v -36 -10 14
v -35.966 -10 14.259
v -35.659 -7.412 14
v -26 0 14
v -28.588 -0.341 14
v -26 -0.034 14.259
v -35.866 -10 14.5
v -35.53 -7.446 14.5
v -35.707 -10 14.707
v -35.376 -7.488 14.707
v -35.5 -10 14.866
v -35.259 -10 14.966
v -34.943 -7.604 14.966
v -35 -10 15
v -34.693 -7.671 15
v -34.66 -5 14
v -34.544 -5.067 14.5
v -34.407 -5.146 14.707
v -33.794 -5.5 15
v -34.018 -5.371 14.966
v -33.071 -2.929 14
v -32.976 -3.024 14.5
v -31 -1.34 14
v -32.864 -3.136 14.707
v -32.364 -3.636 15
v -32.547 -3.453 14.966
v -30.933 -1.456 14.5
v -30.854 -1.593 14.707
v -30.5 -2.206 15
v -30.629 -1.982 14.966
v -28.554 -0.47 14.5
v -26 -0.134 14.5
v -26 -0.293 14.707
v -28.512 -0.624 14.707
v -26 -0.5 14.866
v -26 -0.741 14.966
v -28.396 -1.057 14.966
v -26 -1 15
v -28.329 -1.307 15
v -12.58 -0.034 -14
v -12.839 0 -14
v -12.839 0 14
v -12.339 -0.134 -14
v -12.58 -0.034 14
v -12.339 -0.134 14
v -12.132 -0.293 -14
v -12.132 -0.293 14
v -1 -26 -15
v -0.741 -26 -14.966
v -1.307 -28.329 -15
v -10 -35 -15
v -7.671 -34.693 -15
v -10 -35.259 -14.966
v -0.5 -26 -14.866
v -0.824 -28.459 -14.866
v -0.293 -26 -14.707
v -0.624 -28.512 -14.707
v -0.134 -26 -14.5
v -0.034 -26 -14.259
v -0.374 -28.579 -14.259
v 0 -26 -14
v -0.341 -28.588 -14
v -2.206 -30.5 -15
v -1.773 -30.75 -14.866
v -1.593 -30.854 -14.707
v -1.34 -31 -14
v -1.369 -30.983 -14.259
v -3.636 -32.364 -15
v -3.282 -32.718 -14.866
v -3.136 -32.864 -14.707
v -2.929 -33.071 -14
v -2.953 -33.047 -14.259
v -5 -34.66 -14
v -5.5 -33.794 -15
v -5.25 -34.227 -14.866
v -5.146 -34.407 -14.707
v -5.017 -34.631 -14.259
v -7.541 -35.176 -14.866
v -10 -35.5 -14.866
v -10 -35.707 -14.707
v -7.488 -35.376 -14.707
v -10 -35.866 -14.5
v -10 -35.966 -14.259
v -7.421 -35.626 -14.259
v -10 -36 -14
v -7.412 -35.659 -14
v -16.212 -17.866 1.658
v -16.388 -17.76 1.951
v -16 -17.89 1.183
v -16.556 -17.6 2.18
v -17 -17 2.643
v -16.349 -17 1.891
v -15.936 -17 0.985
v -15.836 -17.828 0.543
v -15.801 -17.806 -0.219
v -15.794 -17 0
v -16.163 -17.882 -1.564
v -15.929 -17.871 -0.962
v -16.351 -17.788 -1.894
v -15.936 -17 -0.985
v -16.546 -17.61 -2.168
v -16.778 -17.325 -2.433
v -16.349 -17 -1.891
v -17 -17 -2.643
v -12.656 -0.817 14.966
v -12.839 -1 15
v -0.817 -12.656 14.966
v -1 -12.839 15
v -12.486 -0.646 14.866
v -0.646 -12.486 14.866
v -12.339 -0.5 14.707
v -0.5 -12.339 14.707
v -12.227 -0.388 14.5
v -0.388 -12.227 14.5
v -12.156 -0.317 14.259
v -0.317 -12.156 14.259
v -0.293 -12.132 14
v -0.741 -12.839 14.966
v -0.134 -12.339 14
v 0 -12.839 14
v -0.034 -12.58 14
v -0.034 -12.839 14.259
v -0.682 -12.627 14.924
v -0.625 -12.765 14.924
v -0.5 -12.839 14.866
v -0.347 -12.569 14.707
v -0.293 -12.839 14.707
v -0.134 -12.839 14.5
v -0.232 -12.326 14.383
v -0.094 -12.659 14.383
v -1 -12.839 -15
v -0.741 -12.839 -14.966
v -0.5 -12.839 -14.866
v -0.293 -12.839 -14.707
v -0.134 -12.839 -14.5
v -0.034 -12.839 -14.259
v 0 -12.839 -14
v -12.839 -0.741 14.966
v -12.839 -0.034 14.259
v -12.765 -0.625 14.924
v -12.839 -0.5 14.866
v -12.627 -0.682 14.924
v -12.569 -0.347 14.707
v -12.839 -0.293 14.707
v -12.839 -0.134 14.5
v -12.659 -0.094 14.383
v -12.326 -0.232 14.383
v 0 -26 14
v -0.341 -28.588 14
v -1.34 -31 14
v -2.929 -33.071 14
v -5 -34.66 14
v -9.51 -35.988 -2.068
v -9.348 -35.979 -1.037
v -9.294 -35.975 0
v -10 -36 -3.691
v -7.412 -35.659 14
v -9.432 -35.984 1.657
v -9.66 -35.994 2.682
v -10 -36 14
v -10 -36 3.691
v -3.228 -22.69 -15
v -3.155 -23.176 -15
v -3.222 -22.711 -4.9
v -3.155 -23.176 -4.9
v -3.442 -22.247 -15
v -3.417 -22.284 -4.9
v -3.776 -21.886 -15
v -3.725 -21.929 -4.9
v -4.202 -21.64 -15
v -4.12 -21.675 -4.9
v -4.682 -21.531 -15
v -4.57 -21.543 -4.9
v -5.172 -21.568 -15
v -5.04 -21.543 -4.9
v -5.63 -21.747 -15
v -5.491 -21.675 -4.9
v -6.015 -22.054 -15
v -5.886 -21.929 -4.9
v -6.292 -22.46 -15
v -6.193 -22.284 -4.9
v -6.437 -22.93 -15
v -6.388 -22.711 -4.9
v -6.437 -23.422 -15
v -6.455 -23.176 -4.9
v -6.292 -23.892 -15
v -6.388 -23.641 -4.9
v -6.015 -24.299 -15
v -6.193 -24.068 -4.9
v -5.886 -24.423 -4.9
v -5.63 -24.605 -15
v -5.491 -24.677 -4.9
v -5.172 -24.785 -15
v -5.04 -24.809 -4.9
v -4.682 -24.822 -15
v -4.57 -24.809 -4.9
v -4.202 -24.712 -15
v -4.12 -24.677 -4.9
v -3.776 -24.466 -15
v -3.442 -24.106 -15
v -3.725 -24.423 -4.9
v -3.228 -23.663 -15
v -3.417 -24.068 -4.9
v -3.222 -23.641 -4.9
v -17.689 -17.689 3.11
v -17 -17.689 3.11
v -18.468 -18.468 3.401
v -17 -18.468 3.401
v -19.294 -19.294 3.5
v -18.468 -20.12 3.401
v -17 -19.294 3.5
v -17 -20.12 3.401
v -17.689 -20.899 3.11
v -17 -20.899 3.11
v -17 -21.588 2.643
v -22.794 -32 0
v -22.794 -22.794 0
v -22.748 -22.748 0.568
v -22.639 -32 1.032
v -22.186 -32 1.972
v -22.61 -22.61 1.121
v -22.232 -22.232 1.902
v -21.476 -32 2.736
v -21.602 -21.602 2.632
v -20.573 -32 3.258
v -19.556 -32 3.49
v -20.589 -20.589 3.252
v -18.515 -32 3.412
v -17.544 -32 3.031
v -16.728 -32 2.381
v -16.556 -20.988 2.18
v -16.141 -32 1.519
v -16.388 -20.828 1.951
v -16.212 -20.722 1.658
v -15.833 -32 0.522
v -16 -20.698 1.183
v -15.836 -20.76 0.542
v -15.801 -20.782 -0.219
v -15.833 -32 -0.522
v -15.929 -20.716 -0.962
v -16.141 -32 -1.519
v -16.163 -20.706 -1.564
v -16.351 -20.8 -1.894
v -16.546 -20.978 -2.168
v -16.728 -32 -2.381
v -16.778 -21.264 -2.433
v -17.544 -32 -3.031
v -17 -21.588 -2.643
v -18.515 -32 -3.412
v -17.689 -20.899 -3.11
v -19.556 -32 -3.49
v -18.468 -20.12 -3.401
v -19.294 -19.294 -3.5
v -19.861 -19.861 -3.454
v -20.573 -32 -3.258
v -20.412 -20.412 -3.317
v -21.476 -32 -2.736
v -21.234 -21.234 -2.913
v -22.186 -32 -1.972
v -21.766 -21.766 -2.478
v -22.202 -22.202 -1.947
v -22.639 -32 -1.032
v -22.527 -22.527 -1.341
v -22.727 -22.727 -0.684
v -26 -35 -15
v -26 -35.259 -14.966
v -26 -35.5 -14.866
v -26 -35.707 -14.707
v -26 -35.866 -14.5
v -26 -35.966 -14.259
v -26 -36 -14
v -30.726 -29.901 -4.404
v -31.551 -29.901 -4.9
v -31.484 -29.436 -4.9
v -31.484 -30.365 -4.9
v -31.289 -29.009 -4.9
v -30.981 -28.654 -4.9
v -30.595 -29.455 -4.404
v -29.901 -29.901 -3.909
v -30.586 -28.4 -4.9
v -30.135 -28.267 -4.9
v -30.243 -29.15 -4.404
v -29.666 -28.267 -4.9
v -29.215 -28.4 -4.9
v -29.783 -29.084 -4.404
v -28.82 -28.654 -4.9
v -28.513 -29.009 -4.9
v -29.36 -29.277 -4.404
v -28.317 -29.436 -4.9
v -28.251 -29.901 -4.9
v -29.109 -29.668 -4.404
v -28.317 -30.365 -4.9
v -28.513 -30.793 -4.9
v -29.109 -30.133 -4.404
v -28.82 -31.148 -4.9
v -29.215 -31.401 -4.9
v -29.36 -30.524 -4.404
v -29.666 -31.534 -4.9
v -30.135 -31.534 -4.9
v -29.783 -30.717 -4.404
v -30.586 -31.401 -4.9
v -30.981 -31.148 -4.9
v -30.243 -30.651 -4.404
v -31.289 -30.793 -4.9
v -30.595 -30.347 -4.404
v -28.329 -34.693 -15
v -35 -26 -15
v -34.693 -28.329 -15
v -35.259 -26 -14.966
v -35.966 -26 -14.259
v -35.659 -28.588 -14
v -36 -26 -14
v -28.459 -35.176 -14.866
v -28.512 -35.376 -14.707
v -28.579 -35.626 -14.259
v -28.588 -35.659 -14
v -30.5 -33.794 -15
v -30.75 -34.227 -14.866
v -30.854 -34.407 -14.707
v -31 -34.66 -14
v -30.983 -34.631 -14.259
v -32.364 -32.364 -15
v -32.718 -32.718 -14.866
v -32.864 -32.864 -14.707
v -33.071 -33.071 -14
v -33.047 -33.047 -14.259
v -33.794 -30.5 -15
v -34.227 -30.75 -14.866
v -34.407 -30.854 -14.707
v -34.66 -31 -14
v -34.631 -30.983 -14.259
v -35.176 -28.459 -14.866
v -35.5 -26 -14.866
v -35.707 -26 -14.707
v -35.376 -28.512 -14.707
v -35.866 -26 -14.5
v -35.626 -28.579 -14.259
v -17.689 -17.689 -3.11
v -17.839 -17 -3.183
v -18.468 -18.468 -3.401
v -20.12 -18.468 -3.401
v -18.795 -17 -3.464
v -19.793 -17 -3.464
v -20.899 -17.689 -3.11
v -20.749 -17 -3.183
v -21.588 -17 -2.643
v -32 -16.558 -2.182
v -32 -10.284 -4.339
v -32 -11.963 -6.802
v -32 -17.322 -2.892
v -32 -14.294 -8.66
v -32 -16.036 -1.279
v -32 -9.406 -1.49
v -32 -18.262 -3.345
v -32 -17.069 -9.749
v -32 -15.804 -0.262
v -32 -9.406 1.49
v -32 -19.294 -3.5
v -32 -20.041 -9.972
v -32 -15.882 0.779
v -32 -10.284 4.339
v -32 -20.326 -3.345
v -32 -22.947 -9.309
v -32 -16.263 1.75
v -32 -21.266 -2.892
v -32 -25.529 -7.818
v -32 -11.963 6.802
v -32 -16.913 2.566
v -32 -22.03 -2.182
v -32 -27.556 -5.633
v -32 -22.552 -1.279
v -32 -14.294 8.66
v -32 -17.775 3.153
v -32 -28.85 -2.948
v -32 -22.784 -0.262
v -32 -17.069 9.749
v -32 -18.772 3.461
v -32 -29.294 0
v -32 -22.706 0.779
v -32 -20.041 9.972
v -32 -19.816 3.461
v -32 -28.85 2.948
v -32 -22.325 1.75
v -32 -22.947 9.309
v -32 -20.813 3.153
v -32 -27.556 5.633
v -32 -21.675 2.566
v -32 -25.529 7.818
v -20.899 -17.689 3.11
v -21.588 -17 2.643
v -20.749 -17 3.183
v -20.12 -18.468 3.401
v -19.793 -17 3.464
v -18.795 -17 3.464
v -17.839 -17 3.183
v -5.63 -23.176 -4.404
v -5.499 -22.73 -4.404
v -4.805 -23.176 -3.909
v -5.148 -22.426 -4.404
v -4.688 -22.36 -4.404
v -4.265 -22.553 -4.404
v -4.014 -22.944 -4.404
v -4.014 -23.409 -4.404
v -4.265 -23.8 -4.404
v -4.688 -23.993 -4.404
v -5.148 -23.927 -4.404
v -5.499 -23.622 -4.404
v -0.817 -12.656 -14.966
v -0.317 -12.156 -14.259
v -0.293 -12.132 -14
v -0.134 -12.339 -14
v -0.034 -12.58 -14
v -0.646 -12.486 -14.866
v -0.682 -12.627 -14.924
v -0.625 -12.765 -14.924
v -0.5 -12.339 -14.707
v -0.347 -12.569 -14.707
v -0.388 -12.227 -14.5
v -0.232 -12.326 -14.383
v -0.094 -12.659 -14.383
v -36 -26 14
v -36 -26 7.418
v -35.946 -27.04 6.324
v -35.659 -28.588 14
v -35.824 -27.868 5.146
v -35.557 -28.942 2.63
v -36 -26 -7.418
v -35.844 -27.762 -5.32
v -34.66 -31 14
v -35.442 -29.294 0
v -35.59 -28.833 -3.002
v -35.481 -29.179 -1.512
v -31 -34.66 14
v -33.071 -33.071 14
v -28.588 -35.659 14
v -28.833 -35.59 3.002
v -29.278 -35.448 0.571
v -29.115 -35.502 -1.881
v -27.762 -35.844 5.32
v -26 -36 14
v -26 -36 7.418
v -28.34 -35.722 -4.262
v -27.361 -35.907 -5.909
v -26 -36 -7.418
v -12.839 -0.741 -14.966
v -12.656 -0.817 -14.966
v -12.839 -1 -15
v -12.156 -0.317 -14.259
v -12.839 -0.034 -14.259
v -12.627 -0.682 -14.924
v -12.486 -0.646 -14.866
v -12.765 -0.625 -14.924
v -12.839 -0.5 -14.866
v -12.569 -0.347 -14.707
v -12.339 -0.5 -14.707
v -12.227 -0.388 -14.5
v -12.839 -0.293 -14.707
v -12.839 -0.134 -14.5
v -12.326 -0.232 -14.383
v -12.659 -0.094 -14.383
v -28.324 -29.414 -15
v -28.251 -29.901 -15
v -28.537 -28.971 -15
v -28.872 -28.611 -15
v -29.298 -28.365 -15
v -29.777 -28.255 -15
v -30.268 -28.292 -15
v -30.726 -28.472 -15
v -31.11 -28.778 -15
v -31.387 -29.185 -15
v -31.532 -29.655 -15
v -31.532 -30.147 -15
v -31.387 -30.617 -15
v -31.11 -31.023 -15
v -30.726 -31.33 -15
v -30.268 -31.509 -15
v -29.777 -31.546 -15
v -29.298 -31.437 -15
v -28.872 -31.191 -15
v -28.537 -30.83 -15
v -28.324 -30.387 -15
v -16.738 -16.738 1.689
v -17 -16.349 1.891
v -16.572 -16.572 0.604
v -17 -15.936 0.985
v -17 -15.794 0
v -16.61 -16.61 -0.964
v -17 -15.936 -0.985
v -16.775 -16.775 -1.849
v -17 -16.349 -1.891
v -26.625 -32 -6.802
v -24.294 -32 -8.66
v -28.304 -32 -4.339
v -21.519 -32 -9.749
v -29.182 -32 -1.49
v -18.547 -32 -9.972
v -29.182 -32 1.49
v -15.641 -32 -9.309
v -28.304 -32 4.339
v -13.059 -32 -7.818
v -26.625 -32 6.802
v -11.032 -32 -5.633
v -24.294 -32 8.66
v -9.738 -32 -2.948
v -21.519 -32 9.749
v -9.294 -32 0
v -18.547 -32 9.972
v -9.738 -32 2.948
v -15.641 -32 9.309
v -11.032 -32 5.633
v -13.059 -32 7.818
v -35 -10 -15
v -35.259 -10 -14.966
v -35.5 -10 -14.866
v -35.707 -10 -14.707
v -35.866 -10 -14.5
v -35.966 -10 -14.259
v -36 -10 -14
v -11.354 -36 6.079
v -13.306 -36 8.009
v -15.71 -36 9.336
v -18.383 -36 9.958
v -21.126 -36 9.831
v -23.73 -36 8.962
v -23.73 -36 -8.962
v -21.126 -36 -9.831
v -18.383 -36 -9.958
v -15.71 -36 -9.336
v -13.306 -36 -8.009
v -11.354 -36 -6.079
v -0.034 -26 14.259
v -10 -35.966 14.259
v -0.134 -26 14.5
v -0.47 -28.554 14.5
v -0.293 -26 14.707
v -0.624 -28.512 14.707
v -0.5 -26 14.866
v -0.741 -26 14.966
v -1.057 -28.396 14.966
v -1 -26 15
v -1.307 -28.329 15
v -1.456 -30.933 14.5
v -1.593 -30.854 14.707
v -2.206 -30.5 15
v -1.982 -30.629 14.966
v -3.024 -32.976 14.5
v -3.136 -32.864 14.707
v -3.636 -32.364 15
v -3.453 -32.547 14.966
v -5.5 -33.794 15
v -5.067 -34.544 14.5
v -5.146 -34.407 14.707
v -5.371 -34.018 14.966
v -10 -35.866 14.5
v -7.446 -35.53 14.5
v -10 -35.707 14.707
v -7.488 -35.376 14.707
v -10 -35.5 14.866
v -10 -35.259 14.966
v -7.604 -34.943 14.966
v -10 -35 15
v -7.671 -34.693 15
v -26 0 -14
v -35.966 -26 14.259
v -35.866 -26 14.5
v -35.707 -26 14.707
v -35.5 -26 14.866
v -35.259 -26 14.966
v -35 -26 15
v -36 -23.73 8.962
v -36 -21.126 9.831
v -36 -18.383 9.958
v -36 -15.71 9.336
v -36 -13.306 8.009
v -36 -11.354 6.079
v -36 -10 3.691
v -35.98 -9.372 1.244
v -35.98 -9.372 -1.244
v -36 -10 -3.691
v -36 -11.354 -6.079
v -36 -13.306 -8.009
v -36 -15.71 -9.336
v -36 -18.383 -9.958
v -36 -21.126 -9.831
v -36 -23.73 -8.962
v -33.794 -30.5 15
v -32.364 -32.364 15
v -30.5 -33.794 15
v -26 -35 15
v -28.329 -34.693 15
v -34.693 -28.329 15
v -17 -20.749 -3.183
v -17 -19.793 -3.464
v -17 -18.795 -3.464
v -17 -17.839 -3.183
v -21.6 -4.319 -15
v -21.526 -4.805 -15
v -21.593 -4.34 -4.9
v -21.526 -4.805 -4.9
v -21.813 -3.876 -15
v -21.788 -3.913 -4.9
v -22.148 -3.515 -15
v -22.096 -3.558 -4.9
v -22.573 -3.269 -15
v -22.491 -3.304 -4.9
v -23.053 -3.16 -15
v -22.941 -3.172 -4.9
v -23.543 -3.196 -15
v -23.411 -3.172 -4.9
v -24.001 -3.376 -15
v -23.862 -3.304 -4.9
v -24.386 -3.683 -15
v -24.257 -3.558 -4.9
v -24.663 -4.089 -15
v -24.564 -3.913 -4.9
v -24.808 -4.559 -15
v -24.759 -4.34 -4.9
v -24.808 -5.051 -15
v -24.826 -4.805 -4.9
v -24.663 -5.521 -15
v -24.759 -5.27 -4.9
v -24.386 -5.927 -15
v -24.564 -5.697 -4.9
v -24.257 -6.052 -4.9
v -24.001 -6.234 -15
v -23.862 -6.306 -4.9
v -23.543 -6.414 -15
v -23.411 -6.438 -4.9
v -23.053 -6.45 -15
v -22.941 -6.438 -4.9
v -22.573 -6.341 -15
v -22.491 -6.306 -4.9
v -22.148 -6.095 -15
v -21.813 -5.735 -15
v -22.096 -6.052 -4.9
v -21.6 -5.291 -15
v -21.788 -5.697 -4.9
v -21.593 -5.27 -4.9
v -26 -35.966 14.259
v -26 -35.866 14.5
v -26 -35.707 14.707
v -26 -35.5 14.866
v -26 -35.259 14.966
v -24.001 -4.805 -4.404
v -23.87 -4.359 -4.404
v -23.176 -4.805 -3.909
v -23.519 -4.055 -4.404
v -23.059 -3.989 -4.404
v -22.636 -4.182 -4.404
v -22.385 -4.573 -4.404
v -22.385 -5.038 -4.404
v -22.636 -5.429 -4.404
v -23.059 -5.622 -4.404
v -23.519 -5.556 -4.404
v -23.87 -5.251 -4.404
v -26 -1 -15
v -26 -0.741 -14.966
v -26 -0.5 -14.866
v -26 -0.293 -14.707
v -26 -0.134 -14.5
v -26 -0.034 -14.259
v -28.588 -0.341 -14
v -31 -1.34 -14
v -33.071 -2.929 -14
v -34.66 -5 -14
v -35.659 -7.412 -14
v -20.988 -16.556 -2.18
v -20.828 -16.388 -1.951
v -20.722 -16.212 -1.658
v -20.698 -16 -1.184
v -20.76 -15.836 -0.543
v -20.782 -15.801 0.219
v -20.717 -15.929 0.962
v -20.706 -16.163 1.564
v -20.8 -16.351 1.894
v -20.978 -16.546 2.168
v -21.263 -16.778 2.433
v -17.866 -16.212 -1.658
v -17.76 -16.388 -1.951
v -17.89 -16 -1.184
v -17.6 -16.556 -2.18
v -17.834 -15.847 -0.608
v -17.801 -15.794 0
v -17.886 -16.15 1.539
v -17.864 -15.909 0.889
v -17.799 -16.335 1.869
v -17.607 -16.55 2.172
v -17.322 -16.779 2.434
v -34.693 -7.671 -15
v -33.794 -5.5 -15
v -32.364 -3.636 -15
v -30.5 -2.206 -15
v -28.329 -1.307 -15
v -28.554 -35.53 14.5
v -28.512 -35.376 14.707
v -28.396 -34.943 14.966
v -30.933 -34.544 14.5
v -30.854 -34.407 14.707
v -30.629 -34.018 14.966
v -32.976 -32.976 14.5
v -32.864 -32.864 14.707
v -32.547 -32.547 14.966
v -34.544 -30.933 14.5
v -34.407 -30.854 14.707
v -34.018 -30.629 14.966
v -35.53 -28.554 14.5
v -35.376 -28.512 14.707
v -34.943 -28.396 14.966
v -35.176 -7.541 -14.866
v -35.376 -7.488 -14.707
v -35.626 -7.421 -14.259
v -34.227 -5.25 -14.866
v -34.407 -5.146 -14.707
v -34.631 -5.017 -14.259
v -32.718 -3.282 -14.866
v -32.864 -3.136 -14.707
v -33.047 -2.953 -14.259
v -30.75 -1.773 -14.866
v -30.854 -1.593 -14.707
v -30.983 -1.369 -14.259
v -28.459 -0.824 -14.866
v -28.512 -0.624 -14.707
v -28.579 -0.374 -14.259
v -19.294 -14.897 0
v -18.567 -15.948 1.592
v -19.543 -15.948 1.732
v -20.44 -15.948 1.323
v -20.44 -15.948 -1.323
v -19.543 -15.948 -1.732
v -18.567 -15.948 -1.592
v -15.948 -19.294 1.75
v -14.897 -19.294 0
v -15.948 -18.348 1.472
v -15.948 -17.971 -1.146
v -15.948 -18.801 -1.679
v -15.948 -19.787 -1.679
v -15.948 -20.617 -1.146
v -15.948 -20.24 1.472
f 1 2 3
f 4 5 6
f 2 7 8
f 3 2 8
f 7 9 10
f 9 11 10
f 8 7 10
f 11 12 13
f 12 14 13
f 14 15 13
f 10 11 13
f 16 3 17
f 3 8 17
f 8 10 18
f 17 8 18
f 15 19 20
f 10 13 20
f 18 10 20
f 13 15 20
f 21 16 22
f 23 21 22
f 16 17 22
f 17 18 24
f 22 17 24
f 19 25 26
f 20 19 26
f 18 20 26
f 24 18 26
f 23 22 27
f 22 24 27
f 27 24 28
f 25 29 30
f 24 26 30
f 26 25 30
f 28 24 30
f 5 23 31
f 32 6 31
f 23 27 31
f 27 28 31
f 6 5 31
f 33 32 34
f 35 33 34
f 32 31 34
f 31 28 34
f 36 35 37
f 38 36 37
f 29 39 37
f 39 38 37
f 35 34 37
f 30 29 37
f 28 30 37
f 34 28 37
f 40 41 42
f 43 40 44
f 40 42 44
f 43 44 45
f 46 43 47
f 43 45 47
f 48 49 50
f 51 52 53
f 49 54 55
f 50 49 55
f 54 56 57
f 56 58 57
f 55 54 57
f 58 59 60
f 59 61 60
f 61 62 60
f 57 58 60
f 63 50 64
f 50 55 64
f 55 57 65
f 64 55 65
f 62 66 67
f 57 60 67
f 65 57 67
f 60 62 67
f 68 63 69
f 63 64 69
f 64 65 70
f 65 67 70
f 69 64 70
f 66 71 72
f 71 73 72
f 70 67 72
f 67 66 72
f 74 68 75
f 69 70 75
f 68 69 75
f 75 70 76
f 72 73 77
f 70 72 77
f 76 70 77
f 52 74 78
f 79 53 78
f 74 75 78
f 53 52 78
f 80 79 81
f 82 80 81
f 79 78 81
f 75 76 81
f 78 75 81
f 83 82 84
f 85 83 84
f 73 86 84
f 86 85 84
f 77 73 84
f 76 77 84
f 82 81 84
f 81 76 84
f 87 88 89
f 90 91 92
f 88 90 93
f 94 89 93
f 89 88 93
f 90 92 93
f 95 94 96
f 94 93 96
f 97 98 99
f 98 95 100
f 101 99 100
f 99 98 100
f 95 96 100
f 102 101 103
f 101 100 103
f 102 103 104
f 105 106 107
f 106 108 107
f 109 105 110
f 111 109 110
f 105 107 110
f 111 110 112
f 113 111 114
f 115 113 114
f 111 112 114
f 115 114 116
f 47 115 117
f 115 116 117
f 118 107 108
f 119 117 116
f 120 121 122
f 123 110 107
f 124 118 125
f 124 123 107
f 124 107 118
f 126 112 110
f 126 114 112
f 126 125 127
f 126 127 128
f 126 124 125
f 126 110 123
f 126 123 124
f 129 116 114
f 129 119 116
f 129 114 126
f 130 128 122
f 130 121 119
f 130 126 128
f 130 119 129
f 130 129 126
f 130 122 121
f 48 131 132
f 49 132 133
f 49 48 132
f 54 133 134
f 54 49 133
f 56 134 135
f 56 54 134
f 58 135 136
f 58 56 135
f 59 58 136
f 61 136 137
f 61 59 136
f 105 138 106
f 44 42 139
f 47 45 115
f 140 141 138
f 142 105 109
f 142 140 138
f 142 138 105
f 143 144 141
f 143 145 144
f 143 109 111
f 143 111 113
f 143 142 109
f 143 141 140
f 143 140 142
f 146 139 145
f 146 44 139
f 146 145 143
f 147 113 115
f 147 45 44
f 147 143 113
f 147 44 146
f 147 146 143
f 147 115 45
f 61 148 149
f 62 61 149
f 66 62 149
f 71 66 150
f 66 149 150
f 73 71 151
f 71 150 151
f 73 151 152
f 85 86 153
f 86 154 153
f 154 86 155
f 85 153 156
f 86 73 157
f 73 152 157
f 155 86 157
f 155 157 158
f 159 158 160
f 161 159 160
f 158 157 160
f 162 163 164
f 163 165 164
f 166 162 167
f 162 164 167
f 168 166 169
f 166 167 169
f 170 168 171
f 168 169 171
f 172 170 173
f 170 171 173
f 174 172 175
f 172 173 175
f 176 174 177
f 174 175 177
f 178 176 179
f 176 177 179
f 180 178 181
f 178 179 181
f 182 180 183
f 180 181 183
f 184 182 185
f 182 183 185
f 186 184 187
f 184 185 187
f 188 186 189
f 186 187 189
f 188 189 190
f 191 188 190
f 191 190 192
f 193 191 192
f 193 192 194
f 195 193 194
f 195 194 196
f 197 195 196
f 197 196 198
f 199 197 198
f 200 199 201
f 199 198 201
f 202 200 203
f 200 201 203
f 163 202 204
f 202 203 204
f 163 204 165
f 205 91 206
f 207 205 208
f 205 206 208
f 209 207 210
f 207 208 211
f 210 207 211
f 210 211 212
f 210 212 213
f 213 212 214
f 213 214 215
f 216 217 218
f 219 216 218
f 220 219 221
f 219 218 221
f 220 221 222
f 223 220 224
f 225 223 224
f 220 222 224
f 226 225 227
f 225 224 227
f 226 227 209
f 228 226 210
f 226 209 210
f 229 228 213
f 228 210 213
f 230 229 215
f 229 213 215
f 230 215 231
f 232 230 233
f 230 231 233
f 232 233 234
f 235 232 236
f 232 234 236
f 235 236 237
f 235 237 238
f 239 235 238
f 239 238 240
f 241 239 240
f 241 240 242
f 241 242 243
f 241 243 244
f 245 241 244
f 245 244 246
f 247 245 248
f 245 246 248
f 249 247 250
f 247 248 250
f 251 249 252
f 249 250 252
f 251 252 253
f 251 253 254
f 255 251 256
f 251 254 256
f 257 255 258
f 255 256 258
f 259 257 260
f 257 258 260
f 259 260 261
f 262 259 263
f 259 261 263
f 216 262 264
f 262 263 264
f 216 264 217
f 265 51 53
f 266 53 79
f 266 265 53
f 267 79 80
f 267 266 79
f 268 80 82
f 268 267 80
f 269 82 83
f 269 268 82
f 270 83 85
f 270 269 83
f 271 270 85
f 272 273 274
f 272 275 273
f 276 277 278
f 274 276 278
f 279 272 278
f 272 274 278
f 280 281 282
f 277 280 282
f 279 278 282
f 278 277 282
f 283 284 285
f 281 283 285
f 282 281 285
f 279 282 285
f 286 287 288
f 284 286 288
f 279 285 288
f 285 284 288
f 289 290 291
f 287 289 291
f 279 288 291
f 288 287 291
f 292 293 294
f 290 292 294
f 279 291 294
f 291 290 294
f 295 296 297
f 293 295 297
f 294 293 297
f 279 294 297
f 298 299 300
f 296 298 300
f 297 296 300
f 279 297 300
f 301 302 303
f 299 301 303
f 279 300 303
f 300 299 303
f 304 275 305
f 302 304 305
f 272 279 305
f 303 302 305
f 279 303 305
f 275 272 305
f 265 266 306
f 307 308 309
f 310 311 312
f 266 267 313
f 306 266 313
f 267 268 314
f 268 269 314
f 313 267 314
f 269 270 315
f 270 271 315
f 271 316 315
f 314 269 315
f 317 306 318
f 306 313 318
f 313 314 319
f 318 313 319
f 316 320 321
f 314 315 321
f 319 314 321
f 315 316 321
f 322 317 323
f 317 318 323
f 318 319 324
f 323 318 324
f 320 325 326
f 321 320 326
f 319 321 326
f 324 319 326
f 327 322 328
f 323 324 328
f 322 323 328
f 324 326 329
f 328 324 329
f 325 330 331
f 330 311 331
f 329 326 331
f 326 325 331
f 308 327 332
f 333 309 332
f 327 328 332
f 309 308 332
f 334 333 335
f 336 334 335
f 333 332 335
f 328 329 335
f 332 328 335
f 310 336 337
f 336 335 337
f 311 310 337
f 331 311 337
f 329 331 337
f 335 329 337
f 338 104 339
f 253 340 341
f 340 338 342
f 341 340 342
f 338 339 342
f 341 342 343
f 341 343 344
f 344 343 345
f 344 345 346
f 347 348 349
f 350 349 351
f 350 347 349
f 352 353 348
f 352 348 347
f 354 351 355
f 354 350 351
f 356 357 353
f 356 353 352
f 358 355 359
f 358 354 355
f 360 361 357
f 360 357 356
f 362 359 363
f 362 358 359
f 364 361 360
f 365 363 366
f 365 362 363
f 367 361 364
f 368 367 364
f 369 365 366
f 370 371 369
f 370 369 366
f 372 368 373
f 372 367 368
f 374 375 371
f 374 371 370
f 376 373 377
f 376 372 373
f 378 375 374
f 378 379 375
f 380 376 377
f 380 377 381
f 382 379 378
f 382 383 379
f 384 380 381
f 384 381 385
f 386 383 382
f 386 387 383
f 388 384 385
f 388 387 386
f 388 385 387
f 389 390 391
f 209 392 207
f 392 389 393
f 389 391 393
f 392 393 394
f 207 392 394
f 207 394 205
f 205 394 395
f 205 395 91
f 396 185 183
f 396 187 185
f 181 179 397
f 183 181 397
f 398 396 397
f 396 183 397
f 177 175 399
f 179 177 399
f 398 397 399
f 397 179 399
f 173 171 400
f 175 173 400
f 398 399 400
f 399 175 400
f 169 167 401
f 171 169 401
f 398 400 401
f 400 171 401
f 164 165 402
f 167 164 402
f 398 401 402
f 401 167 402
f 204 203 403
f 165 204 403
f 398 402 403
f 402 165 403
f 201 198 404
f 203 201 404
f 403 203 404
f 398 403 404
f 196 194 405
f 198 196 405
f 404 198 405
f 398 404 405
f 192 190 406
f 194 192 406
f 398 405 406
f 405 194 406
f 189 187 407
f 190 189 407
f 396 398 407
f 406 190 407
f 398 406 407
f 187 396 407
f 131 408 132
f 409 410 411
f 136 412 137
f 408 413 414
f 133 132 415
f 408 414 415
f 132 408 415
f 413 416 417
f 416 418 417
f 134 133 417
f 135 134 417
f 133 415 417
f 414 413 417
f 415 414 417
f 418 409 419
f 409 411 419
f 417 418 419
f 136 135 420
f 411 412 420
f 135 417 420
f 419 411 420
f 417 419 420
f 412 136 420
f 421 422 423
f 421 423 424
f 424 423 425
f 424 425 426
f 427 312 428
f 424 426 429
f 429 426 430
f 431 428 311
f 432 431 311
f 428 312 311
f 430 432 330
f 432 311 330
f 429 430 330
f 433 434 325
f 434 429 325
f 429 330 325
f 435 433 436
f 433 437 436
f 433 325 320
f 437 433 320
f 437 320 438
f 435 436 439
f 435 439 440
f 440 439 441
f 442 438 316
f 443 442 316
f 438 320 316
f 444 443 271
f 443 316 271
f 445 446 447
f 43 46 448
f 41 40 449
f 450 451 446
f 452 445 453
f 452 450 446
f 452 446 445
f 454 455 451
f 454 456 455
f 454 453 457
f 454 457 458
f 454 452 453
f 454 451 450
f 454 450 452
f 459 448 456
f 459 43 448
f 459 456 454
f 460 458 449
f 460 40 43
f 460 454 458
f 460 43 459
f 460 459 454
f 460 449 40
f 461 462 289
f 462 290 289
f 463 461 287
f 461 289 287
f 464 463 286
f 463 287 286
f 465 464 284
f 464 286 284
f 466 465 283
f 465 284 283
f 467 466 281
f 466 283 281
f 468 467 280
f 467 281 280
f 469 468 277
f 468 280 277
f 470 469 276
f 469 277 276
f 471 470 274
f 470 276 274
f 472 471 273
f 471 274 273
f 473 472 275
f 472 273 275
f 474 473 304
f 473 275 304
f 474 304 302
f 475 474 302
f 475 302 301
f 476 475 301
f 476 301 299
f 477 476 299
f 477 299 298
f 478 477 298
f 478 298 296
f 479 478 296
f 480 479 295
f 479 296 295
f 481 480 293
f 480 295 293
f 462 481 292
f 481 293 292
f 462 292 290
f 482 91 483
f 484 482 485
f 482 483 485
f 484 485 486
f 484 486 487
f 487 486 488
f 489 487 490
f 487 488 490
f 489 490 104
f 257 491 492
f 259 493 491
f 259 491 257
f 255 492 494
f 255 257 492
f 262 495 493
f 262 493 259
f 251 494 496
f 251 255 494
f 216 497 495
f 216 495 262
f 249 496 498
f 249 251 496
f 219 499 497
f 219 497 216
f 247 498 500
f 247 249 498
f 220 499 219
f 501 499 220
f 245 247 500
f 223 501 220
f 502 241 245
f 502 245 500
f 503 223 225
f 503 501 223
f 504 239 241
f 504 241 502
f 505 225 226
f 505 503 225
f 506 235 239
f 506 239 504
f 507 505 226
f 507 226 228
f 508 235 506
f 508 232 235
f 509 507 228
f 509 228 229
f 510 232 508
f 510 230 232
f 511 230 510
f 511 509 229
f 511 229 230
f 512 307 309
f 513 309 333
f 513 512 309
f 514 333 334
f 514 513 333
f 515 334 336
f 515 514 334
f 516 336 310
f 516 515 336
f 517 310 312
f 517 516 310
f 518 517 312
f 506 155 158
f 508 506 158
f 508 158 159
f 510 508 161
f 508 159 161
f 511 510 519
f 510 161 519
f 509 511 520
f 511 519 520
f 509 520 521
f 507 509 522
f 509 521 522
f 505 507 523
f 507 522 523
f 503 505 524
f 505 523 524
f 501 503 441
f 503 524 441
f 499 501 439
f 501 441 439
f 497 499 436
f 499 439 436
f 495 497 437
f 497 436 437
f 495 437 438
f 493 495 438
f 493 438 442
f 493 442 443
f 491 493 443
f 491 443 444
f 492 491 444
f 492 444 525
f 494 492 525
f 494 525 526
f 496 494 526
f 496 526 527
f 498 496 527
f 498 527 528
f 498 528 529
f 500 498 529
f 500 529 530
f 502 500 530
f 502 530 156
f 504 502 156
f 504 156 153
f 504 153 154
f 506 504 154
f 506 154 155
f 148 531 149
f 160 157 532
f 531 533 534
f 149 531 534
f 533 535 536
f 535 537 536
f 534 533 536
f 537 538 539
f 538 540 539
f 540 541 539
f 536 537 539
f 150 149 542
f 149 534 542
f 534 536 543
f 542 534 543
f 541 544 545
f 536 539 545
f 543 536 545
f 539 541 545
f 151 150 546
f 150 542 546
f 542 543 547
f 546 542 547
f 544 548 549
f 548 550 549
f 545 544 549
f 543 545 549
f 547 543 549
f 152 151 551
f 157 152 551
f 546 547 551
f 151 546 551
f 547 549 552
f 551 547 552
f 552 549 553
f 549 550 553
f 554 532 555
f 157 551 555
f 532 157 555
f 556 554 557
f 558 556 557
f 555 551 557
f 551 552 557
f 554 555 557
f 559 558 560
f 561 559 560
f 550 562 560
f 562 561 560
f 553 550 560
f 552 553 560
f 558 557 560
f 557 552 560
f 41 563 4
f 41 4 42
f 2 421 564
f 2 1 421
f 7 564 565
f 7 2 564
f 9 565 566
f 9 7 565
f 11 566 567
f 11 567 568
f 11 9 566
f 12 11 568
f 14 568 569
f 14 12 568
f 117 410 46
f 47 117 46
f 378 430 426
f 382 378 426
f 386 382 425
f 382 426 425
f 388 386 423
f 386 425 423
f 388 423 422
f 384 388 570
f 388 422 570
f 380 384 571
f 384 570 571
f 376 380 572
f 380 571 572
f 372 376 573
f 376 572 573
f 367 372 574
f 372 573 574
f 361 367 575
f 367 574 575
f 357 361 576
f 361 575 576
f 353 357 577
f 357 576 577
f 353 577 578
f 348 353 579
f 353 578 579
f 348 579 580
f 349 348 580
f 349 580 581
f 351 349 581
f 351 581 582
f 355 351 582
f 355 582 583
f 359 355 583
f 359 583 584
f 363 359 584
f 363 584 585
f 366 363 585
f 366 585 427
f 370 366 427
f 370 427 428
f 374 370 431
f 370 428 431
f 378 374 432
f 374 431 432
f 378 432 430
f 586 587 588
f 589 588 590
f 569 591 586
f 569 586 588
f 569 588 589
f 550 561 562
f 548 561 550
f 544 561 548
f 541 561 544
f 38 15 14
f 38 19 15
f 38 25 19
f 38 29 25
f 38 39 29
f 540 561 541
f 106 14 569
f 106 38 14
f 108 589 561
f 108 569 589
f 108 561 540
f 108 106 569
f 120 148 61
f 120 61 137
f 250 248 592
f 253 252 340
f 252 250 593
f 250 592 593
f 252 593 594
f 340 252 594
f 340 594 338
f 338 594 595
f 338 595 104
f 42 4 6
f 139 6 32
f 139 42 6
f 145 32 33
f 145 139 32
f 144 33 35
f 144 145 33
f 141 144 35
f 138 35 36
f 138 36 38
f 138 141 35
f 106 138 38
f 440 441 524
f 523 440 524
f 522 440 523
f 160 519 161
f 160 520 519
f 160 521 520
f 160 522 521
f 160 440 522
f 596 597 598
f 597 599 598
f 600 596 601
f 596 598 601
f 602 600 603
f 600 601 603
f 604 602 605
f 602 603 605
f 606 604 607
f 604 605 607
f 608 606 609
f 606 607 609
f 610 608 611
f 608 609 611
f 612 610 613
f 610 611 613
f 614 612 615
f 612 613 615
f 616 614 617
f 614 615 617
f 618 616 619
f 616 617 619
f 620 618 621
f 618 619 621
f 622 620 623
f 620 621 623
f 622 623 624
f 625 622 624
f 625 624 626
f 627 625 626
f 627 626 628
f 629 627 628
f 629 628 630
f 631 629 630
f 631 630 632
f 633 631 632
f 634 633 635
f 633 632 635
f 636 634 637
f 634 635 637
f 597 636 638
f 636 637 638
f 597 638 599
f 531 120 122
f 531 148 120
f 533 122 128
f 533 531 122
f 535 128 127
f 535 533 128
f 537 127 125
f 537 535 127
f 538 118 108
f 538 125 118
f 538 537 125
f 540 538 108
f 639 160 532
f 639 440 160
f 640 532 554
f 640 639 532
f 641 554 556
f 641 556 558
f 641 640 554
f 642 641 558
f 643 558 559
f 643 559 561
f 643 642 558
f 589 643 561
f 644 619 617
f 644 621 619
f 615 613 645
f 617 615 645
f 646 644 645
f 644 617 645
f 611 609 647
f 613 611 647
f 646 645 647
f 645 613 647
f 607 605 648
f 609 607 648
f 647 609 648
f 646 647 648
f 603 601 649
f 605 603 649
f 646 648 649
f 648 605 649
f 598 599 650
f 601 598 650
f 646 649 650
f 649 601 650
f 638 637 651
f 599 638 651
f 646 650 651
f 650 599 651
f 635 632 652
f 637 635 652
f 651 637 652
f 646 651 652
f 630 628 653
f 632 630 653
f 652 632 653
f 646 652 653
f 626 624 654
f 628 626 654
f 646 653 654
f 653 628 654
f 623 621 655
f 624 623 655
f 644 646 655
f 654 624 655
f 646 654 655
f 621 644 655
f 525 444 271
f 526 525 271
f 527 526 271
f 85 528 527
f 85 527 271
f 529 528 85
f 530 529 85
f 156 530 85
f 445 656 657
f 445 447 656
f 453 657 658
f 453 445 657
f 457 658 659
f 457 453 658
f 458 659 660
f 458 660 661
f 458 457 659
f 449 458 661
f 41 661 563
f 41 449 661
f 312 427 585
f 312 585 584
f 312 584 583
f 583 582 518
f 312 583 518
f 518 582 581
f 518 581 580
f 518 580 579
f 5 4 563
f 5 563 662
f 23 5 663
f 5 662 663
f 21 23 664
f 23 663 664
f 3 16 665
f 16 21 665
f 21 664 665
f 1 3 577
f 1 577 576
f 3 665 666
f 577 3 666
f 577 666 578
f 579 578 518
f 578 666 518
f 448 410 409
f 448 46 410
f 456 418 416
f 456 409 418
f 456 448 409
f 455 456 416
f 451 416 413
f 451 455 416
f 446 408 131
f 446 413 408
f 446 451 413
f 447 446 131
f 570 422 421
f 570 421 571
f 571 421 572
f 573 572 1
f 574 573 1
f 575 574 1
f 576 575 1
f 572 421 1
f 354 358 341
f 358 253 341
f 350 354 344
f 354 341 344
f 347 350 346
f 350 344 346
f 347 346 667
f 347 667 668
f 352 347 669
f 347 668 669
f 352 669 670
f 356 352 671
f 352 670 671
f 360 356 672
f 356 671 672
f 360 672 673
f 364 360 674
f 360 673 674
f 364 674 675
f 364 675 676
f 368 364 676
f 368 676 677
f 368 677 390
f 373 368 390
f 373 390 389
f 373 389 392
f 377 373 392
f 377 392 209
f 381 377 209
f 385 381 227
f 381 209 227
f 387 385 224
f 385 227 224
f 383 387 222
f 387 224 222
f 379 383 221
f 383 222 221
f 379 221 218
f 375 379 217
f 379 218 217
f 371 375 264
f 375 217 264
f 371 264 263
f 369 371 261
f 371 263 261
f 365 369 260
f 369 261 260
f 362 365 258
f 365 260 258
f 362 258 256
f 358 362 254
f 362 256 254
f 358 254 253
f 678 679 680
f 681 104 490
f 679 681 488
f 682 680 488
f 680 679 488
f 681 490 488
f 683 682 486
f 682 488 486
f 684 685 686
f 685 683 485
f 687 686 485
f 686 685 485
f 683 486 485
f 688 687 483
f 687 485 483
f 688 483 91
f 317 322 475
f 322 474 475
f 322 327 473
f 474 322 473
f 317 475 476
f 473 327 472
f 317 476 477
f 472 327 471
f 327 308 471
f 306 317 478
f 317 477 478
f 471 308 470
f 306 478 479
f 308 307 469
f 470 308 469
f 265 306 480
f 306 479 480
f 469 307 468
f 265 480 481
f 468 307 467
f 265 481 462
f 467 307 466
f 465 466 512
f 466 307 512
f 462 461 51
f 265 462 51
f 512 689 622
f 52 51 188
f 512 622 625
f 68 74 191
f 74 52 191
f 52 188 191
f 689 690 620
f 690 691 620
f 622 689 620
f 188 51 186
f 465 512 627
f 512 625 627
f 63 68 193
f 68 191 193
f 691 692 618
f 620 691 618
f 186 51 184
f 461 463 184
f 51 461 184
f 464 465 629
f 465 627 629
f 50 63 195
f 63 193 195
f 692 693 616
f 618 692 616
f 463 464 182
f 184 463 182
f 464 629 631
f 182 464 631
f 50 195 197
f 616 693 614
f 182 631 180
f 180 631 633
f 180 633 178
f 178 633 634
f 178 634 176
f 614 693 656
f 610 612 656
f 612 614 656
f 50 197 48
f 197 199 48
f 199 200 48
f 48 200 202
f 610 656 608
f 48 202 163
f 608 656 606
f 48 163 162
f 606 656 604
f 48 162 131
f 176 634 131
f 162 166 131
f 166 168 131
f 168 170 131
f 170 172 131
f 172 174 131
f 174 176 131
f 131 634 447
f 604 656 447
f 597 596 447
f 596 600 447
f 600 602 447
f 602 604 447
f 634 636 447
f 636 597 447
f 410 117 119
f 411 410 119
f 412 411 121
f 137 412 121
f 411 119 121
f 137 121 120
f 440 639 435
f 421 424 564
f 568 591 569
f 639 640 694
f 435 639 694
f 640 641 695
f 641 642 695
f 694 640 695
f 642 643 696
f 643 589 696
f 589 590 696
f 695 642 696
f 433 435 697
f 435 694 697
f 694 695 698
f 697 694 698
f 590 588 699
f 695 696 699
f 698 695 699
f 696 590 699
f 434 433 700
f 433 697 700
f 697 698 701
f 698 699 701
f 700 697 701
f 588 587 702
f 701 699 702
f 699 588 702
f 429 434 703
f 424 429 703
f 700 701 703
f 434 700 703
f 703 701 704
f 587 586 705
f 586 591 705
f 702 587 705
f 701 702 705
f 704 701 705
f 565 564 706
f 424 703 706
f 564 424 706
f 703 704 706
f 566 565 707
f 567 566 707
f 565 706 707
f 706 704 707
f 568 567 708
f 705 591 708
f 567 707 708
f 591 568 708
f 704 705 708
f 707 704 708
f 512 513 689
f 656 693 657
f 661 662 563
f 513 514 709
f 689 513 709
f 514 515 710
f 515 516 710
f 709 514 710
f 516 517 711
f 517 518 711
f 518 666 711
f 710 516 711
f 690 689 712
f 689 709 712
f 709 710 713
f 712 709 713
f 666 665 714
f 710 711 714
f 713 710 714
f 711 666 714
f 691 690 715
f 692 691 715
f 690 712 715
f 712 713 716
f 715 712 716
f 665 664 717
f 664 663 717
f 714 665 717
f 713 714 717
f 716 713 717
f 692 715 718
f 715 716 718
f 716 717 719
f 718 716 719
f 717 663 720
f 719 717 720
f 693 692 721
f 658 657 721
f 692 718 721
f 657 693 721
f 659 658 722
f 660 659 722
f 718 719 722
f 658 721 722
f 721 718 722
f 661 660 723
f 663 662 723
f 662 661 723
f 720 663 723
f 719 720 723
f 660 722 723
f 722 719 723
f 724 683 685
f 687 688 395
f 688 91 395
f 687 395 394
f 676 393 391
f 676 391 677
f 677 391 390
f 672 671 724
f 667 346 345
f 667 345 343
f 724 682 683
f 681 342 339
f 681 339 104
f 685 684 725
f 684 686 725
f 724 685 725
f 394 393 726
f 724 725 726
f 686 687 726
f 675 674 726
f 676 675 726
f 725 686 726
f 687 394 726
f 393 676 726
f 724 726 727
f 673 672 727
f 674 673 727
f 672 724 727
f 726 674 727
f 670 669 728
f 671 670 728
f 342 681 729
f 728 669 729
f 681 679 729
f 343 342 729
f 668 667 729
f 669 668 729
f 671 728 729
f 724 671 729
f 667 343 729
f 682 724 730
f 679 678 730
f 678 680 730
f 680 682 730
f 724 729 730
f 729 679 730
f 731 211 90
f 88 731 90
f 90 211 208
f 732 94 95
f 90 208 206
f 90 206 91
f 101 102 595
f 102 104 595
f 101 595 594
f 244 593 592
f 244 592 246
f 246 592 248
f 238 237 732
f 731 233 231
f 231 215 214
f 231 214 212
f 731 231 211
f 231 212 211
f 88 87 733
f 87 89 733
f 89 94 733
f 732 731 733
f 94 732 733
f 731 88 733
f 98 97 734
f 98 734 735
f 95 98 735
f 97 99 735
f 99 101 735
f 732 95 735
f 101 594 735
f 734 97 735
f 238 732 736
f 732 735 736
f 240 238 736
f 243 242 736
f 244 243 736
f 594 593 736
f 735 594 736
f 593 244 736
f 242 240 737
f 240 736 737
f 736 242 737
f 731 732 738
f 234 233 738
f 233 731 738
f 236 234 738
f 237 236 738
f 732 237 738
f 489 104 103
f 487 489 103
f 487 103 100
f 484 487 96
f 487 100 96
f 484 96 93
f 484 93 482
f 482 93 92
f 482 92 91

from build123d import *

# Parameters (mm, degrees)
SKETCH1_W                 = 36
SKETCH1_H                 = 36
BOSS_EXTRUDE1_DEPTH       = 15
SKETCH2_R                 = 10
CUT_EXTRUDE1_DEPTH        = 4
SKETCH4_R                 = 10
CUT_EXTRUDE2_DEPTH        = 4
M8X1_0_TAPPED_HOLE1_D     = 7
M8X1_0_TAPPED_HOLE1_DEPTH = 15
M8X1_0_TAPPED_HOLE1_TIP   = 2.103012167
M8X1_0_TAPPED_HOLE2_D     = 7
M8X1_0_TAPPED_HOLE2_DEPTH = 15
M8X1_0_TAPPED_HOLE2_TIP   = 2.103012167
FILLET1_R                 = 10
M4X0_7_TAPPED_HOLE1_D     = 3.3
M4X0_7_TAPPED_HOLE1_DEPTH = 10.1
M4X0_7_TAPPED_HOLE1_TIP   = 0.991420021
CUT_EXTRUDE3_DEPTH        = 60.093146983
FILLET2_R                 = 1


with BuildPart() as part:
    # Sketch1 → Boss-Extrude1 (new, symmetric)
    with BuildSketch(Plane.XY):
        with Locations((-18, -18)):
            Rectangle(SKETCH1_W, SKETCH1_H)
    extrude(amount=BOSS_EXTRUDE1_DEPTH, both=True)

    # Sketch2 → Cut-Extrude1 (cut)
    with BuildSketch(Plane.XZ.offset(36)):
        with Locations((-19.294, 0)):
            Circle(SKETCH2_R)
    extrude(amount=-CUT_EXTRUDE1_DEPTH, mode=Mode.SUBTRACT)

    # Sketch4 → Cut-Extrude2 (cut)
    with BuildSketch(Plane.ZY.offset(36)):
        with Locations(Location((0, -19.294, 0), (0, 0, 270))):
            Circle(SKETCH4_R)
    extrude(amount=-CUT_EXTRUDE2_DEPTH, mode=Mode.SUBTRACT)

    # M8x1.0 Tapped Hole1
    with Locations(Plane.ZY.offset(32)):
        with Locations((0, -19.294)):
            Hole(M8X1_0_TAPPED_HOLE1_D / 2, depth=M8X1_0_TAPPED_HOLE1_DEPTH)
            with Locations((0, 0, -(M8X1_0_TAPPED_HOLE1_DEPTH + M8X1_0_TAPPED_HOLE1_TIP / 2))):  # 118° drill point
                Cone(0, M8X1_0_TAPPED_HOLE1_D / 2, M8X1_0_TAPPED_HOLE1_TIP, mode=Mode.SUBTRACT)

    # M8x1.0 Tapped Hole2
    with Locations(Plane.XZ.offset(32)):
        with Locations((-19.294, 0)):
            Hole(M8X1_0_TAPPED_HOLE2_D / 2, depth=M8X1_0_TAPPED_HOLE2_DEPTH)
            with Locations((0, 0, -(M8X1_0_TAPPED_HOLE2_DEPTH + M8X1_0_TAPPED_HOLE2_TIP / 2))):  # 118° drill point
                Cone(0, M8X1_0_TAPPED_HOLE2_D / 2, M8X1_0_TAPPED_HOLE2_TIP, mode=Mode.SUBTRACT)

    # Fillet1
    # the kernel refuses this fillet: 10 mm, written as the material it takes off along each edge
    with BuildSketch(Plane(origin=(0, -36, 40), x_dir=(0, 1, 0), z_dir=(0, 0, -1)), Plane(origin=(-36, 0, -40), x_dir=(1, 0, 0), z_dir=(0, 0, 1))) as fillet1_piece_1:
        with BuildLine():
            CenterArc((FILLET1_R, -FILLET1_R), FILLET1_R, 90, 90)
            Line((0, -FILLET1_R), (0, 0))
            Line((0, 0), (FILLET1_R, 0))
        make_face()
    extrude(amount=80, mode=Mode.SUBTRACT)
    with BuildSketch(Plane(origin=(-36, -36, -40), x_dir=(1, 0, 0), z_dir=(0, 0, 1))) as fillet1_piece_2:
        with BuildLine():
            CenterArc((FILLET1_R, FILLET1_R), FILLET1_R, 180, 90)
            Line((0, FILLET1_R), (0, 0))
            Line((0, 0), (FILLET1_R, 0))
        make_face()
    extrude(amount=80, mode=Mode.SUBTRACT)

    # M4x0.7 Tapped Hole1
    with Locations(Plane(origin=(0, 0, -15), x_dir=(-1, 0, 0), z_dir=(0, 0, -1))):
        with Locations((29.900601718, -29.900601718), (4.805112606, -23.176285677), (23.176285677, -4.805112606)):
            Hole(M4X0_7_TAPPED_HOLE1_D / 2, depth=M4X0_7_TAPPED_HOLE1_DEPTH)
            with Locations((0, 0, -(M4X0_7_TAPPED_HOLE1_DEPTH + M4X0_7_TAPPED_HOLE1_TIP / 2))):  # 118° drill point
                Cone(0, M4X0_7_TAPPED_HOLE1_D / 2, M4X0_7_TAPPED_HOLE1_TIP, mode=Mode.SUBTRACT)

    # Sketch12 → Cut-Extrude3 (cut, through all)
    with BuildSketch(Plane(origin=(0, 0, -15), x_dir=(-1, 0, 0), z_dir=(0, 0, -1))):
        Polygon((0, -12.425049096), (12.425049096, 0), (0, 0), align=None)
    extrude(amount=-CUT_EXTRUDE3_DEPTH, mode=Mode.SUBTRACT)

    # Fillet2
    fillet2_edges = [part.edges().sort_by_distance(p)[0] for p in [
        (0, -12.425049096, 0),
        (-6.212524548, -6.212524548, 15),
        (-12.425049096, 0, 0),
        (-6.212524548, -6.212524548, -15),
        (-36, -18, -15),
        (-36, -18, 15),
        (0, -19.212524548, -15),
        (-18, -36, -15),
        (-33.071067812, -33.071067812, -15),
        (-2.928932188, -33.071067812, -15),
        (-33.071067812, -2.928932188, -15),
        (0, -19.212524548, 15),
        (-18, -36, 15),
        (-33.071067812, -33.071067812, 15),
        (-2.928932188, -33.071067812, 15),
        (-33.071067812, -2.928932188, 15),
        (-19.212524548, 0, -15),
        (-19.212524548, 0, 15),
    ]]
    fillet(fillet2_edges, radius=FILLET2_R)


solid = part.part
